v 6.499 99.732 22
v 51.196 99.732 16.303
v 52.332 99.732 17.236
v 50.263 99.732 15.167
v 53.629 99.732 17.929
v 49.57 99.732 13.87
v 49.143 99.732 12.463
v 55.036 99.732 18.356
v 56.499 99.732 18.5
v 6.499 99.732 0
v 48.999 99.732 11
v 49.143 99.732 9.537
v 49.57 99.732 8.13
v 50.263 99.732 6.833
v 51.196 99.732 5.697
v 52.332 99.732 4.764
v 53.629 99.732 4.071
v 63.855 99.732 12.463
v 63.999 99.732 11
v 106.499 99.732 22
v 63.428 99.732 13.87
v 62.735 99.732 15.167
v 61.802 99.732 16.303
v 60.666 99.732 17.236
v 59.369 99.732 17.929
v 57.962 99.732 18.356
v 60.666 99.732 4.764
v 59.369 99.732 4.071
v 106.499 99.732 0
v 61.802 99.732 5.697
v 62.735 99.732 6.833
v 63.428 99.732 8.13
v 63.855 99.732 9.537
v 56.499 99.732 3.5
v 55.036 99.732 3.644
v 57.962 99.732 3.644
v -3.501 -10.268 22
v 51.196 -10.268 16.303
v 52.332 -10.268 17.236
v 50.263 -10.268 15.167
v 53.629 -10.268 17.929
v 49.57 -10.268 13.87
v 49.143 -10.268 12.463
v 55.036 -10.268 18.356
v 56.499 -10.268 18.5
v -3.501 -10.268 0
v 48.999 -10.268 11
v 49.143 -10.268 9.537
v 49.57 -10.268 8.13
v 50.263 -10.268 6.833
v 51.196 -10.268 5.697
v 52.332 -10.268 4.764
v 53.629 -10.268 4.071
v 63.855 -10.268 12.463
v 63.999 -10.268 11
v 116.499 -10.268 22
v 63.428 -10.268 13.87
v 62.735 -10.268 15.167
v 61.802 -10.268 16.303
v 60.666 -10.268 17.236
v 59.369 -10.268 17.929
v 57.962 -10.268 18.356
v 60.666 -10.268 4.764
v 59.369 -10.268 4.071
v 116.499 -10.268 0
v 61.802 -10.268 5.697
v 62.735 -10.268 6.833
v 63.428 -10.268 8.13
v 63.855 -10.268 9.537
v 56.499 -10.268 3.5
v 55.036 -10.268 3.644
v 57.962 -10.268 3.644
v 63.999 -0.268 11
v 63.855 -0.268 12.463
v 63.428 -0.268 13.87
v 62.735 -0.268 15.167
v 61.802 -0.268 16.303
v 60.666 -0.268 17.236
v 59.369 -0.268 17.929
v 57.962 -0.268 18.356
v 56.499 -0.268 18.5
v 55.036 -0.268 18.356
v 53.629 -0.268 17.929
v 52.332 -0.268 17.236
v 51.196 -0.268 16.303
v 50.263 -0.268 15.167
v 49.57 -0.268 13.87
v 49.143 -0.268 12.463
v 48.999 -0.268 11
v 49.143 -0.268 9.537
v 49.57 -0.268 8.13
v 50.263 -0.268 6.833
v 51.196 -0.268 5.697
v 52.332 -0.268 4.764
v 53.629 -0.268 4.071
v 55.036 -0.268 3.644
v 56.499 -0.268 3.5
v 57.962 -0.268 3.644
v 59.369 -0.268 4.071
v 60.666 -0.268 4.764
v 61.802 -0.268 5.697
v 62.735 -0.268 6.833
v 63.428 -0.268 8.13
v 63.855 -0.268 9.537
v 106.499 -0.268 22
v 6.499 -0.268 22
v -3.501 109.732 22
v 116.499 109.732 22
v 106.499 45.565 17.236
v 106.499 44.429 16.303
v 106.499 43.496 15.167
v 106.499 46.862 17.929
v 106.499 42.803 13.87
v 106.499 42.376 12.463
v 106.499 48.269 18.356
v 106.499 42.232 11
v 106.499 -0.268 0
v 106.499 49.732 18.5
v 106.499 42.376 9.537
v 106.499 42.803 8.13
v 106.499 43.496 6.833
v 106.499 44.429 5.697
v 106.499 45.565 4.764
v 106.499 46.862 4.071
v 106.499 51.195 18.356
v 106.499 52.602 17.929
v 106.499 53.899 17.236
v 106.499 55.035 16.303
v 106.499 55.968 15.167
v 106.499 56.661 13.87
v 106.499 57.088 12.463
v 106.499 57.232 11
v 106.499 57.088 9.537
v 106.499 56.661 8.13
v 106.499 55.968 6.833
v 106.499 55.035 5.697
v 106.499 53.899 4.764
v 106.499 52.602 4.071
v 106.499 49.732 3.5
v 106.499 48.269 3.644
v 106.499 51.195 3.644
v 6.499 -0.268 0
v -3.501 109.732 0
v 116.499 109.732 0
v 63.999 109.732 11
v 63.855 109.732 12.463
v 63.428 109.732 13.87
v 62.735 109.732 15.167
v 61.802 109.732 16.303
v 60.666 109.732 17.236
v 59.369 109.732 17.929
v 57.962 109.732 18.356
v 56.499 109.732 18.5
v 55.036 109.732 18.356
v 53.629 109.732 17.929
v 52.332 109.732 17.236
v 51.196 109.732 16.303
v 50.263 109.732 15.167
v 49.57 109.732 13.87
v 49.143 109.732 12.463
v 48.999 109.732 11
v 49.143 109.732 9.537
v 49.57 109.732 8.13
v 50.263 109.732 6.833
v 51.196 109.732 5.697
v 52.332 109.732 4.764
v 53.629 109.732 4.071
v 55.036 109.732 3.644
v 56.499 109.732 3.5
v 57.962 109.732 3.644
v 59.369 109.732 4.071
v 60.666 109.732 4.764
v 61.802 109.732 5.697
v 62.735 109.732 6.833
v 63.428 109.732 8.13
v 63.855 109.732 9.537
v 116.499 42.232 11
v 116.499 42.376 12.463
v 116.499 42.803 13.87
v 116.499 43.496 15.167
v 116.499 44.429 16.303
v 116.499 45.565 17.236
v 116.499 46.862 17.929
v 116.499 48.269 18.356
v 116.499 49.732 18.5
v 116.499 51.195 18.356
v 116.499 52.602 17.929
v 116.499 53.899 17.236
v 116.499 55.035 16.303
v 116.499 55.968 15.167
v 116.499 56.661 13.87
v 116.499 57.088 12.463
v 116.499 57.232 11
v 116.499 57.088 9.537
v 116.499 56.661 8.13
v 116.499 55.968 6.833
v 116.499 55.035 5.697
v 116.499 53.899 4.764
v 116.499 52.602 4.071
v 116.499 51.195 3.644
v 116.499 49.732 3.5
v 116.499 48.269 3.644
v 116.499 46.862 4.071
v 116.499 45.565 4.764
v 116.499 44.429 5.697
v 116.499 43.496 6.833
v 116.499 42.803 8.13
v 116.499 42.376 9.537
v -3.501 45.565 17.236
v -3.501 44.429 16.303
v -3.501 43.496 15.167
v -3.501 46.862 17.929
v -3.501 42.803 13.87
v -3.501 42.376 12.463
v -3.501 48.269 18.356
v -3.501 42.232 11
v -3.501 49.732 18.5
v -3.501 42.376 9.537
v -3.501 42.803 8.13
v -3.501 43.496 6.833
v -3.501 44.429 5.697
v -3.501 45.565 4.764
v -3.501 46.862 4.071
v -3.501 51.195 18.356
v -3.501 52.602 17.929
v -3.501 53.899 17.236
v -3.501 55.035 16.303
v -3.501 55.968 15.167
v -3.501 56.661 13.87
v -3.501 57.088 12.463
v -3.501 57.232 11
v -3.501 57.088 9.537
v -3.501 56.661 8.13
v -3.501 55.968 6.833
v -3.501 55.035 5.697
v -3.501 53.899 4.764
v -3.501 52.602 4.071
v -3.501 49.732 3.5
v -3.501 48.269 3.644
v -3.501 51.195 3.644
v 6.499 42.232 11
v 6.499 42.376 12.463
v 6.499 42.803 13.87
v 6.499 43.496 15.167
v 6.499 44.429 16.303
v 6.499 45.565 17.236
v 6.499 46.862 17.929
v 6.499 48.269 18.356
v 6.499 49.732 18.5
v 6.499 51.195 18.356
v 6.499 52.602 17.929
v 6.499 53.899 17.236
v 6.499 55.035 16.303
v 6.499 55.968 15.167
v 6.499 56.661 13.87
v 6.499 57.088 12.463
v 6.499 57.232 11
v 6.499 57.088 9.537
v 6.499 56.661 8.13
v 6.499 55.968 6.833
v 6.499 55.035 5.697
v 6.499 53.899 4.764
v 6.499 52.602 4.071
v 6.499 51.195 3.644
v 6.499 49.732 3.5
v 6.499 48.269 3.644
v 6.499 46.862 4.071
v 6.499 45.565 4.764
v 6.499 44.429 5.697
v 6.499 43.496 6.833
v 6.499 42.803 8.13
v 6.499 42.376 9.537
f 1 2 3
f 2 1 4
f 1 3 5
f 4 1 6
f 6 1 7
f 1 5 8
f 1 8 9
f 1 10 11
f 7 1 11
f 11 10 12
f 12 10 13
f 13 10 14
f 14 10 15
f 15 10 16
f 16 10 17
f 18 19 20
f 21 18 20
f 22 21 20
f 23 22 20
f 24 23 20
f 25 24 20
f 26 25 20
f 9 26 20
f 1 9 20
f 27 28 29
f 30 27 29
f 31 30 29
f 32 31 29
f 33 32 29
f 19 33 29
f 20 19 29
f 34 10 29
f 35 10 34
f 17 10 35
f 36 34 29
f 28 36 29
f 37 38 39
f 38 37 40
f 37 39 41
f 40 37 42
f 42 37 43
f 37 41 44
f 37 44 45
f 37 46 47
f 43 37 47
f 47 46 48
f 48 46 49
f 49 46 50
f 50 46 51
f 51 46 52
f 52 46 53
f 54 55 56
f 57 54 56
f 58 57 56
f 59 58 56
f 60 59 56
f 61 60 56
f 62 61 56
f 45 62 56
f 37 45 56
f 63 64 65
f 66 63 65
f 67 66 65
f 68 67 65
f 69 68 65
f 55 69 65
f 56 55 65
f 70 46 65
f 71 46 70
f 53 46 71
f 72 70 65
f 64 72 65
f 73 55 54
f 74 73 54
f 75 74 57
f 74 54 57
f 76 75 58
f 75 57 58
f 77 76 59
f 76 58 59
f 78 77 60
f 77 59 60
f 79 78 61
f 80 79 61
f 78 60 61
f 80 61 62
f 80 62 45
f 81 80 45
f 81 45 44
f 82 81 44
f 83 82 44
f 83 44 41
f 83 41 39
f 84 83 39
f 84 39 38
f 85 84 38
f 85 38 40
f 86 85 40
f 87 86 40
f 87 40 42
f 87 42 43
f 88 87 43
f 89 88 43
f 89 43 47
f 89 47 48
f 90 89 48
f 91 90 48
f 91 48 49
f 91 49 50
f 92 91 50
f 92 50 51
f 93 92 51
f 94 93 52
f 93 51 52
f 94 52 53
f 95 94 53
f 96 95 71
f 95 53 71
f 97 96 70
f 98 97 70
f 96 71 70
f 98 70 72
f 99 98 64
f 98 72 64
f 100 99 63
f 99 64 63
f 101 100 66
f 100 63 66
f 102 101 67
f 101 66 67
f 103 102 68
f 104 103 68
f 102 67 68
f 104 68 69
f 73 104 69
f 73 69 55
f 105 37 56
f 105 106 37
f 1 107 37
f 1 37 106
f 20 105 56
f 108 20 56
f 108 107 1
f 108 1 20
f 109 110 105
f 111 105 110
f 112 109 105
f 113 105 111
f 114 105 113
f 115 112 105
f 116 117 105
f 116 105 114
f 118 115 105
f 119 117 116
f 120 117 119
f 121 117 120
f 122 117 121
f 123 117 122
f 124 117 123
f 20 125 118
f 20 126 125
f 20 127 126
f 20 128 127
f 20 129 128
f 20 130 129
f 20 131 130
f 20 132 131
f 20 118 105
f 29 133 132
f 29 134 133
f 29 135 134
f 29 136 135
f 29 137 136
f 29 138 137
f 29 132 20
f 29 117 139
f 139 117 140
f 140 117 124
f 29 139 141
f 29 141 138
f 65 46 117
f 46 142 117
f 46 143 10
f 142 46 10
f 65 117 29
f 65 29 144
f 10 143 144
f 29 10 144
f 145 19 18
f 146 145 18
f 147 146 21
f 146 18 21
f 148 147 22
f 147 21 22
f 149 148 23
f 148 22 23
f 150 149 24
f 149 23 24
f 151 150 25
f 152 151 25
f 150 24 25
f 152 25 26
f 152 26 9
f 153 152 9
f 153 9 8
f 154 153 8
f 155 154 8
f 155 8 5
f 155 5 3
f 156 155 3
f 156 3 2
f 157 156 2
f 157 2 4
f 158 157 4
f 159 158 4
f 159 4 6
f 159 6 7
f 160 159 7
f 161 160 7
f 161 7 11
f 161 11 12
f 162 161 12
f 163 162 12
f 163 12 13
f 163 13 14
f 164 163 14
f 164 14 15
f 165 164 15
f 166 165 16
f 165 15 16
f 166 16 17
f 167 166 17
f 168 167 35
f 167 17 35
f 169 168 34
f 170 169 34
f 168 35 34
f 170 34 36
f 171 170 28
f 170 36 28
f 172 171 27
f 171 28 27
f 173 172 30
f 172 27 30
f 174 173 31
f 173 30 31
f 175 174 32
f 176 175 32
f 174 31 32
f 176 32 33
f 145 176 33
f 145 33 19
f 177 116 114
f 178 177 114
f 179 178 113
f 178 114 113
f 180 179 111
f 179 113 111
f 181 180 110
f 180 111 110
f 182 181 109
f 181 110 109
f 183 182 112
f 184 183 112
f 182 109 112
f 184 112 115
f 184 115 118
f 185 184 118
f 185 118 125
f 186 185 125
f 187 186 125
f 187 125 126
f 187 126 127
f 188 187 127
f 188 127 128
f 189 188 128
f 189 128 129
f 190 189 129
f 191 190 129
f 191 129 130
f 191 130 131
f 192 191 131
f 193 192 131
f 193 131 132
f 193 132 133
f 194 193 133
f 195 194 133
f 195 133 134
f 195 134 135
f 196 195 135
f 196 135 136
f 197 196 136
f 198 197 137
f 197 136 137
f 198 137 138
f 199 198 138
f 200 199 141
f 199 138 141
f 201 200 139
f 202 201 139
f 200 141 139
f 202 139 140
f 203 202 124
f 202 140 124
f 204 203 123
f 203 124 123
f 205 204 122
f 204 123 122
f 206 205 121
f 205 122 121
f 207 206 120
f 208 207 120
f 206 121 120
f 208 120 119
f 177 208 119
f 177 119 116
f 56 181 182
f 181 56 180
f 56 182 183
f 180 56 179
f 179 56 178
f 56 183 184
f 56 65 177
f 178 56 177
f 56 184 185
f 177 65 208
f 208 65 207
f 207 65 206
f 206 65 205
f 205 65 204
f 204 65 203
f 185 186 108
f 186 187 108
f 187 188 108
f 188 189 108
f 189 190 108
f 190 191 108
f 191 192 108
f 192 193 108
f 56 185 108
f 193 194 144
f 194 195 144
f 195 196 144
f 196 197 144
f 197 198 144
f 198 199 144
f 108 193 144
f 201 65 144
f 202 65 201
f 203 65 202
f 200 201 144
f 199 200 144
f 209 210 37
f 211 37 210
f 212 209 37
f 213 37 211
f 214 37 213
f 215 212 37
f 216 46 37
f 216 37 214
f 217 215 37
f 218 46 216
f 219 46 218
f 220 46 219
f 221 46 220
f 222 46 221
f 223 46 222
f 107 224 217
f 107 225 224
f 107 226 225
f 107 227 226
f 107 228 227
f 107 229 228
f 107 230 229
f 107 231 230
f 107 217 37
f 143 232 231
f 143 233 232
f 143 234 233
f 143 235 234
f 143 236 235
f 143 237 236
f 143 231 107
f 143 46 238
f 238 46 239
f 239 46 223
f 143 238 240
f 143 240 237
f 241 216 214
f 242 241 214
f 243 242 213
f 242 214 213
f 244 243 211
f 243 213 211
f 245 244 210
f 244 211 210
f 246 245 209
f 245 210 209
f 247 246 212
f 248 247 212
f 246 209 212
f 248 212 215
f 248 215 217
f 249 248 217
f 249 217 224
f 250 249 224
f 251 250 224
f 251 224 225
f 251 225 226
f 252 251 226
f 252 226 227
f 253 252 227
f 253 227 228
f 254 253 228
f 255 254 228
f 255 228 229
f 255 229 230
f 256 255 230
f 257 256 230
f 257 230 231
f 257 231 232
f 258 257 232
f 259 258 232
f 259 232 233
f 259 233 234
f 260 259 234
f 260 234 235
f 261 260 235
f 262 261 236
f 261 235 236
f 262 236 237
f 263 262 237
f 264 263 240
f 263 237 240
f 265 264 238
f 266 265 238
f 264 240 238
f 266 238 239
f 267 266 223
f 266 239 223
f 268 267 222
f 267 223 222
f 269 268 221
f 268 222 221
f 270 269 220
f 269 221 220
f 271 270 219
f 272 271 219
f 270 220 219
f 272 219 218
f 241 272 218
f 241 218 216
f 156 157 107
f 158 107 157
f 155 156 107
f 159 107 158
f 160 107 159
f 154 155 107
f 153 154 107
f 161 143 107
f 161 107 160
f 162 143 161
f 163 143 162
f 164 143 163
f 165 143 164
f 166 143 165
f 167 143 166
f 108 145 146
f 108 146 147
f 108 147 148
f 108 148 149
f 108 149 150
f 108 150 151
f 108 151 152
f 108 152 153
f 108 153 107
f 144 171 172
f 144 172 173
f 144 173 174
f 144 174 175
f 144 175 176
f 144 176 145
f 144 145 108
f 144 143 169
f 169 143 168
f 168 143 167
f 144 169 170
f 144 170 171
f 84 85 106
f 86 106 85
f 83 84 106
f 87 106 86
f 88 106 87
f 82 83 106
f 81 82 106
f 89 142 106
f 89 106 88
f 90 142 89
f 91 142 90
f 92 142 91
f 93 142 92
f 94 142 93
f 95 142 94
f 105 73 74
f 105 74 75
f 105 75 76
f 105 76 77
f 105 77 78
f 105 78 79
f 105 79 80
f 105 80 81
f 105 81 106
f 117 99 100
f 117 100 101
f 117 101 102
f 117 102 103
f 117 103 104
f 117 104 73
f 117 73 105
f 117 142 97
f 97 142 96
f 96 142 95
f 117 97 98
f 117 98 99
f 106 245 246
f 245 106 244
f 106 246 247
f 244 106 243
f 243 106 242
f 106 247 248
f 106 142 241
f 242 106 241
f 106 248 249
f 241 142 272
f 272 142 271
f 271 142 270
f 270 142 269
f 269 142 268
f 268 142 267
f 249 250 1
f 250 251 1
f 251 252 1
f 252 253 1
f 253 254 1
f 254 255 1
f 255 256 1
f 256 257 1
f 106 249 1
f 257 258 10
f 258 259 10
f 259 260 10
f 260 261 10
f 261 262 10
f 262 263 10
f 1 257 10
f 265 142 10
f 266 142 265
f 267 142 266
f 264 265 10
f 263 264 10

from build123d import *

# Parameters (mm, degrees)
F0_W     = 120
F0_H     = 120
F0_W_2   = 100
F0_H_2   = 100
F1_DEPTH = 22
F2_R     = 7.5
F3_DEPTH = 237
F4_R     = 7.5
F5_DEPTH = 185


with BuildPart() as f1:
    # F0 (on Top) → F1 (new body)
    with BuildSketch(Plane.XY):
        with Locations((56.498835, 49.731983)):
            Rectangle(F0_W, F0_H)
        with Locations((56.498835, 49.731983)):
            Rectangle(F0_W_2, F0_H_2, mode=Mode.SUBTRACT)
    extrude(amount=F1_DEPTH)

    # F2 (on face) → F3 (cut)
    with BuildSketch(Plane.XZ.offset(10.268017)):
        with Locations((56.498835, 11)):
            Circle(F2_R)
    extrude(amount=-F3_DEPTH, mode=Mode.SUBTRACT)

    # F4 (on face) → F5 (cut)
    with BuildSketch(Plane(origin=(-3.501165, 0, 0), x_dir=(0, -1, 0), z_dir=(-1, 0, 0))):
        with Locations((-49.731983, 11)):
            Circle(F4_R)
    extrude(amount=-F5_DEPTH, mode=Mode.SUBTRACT)


solid = f1.part
